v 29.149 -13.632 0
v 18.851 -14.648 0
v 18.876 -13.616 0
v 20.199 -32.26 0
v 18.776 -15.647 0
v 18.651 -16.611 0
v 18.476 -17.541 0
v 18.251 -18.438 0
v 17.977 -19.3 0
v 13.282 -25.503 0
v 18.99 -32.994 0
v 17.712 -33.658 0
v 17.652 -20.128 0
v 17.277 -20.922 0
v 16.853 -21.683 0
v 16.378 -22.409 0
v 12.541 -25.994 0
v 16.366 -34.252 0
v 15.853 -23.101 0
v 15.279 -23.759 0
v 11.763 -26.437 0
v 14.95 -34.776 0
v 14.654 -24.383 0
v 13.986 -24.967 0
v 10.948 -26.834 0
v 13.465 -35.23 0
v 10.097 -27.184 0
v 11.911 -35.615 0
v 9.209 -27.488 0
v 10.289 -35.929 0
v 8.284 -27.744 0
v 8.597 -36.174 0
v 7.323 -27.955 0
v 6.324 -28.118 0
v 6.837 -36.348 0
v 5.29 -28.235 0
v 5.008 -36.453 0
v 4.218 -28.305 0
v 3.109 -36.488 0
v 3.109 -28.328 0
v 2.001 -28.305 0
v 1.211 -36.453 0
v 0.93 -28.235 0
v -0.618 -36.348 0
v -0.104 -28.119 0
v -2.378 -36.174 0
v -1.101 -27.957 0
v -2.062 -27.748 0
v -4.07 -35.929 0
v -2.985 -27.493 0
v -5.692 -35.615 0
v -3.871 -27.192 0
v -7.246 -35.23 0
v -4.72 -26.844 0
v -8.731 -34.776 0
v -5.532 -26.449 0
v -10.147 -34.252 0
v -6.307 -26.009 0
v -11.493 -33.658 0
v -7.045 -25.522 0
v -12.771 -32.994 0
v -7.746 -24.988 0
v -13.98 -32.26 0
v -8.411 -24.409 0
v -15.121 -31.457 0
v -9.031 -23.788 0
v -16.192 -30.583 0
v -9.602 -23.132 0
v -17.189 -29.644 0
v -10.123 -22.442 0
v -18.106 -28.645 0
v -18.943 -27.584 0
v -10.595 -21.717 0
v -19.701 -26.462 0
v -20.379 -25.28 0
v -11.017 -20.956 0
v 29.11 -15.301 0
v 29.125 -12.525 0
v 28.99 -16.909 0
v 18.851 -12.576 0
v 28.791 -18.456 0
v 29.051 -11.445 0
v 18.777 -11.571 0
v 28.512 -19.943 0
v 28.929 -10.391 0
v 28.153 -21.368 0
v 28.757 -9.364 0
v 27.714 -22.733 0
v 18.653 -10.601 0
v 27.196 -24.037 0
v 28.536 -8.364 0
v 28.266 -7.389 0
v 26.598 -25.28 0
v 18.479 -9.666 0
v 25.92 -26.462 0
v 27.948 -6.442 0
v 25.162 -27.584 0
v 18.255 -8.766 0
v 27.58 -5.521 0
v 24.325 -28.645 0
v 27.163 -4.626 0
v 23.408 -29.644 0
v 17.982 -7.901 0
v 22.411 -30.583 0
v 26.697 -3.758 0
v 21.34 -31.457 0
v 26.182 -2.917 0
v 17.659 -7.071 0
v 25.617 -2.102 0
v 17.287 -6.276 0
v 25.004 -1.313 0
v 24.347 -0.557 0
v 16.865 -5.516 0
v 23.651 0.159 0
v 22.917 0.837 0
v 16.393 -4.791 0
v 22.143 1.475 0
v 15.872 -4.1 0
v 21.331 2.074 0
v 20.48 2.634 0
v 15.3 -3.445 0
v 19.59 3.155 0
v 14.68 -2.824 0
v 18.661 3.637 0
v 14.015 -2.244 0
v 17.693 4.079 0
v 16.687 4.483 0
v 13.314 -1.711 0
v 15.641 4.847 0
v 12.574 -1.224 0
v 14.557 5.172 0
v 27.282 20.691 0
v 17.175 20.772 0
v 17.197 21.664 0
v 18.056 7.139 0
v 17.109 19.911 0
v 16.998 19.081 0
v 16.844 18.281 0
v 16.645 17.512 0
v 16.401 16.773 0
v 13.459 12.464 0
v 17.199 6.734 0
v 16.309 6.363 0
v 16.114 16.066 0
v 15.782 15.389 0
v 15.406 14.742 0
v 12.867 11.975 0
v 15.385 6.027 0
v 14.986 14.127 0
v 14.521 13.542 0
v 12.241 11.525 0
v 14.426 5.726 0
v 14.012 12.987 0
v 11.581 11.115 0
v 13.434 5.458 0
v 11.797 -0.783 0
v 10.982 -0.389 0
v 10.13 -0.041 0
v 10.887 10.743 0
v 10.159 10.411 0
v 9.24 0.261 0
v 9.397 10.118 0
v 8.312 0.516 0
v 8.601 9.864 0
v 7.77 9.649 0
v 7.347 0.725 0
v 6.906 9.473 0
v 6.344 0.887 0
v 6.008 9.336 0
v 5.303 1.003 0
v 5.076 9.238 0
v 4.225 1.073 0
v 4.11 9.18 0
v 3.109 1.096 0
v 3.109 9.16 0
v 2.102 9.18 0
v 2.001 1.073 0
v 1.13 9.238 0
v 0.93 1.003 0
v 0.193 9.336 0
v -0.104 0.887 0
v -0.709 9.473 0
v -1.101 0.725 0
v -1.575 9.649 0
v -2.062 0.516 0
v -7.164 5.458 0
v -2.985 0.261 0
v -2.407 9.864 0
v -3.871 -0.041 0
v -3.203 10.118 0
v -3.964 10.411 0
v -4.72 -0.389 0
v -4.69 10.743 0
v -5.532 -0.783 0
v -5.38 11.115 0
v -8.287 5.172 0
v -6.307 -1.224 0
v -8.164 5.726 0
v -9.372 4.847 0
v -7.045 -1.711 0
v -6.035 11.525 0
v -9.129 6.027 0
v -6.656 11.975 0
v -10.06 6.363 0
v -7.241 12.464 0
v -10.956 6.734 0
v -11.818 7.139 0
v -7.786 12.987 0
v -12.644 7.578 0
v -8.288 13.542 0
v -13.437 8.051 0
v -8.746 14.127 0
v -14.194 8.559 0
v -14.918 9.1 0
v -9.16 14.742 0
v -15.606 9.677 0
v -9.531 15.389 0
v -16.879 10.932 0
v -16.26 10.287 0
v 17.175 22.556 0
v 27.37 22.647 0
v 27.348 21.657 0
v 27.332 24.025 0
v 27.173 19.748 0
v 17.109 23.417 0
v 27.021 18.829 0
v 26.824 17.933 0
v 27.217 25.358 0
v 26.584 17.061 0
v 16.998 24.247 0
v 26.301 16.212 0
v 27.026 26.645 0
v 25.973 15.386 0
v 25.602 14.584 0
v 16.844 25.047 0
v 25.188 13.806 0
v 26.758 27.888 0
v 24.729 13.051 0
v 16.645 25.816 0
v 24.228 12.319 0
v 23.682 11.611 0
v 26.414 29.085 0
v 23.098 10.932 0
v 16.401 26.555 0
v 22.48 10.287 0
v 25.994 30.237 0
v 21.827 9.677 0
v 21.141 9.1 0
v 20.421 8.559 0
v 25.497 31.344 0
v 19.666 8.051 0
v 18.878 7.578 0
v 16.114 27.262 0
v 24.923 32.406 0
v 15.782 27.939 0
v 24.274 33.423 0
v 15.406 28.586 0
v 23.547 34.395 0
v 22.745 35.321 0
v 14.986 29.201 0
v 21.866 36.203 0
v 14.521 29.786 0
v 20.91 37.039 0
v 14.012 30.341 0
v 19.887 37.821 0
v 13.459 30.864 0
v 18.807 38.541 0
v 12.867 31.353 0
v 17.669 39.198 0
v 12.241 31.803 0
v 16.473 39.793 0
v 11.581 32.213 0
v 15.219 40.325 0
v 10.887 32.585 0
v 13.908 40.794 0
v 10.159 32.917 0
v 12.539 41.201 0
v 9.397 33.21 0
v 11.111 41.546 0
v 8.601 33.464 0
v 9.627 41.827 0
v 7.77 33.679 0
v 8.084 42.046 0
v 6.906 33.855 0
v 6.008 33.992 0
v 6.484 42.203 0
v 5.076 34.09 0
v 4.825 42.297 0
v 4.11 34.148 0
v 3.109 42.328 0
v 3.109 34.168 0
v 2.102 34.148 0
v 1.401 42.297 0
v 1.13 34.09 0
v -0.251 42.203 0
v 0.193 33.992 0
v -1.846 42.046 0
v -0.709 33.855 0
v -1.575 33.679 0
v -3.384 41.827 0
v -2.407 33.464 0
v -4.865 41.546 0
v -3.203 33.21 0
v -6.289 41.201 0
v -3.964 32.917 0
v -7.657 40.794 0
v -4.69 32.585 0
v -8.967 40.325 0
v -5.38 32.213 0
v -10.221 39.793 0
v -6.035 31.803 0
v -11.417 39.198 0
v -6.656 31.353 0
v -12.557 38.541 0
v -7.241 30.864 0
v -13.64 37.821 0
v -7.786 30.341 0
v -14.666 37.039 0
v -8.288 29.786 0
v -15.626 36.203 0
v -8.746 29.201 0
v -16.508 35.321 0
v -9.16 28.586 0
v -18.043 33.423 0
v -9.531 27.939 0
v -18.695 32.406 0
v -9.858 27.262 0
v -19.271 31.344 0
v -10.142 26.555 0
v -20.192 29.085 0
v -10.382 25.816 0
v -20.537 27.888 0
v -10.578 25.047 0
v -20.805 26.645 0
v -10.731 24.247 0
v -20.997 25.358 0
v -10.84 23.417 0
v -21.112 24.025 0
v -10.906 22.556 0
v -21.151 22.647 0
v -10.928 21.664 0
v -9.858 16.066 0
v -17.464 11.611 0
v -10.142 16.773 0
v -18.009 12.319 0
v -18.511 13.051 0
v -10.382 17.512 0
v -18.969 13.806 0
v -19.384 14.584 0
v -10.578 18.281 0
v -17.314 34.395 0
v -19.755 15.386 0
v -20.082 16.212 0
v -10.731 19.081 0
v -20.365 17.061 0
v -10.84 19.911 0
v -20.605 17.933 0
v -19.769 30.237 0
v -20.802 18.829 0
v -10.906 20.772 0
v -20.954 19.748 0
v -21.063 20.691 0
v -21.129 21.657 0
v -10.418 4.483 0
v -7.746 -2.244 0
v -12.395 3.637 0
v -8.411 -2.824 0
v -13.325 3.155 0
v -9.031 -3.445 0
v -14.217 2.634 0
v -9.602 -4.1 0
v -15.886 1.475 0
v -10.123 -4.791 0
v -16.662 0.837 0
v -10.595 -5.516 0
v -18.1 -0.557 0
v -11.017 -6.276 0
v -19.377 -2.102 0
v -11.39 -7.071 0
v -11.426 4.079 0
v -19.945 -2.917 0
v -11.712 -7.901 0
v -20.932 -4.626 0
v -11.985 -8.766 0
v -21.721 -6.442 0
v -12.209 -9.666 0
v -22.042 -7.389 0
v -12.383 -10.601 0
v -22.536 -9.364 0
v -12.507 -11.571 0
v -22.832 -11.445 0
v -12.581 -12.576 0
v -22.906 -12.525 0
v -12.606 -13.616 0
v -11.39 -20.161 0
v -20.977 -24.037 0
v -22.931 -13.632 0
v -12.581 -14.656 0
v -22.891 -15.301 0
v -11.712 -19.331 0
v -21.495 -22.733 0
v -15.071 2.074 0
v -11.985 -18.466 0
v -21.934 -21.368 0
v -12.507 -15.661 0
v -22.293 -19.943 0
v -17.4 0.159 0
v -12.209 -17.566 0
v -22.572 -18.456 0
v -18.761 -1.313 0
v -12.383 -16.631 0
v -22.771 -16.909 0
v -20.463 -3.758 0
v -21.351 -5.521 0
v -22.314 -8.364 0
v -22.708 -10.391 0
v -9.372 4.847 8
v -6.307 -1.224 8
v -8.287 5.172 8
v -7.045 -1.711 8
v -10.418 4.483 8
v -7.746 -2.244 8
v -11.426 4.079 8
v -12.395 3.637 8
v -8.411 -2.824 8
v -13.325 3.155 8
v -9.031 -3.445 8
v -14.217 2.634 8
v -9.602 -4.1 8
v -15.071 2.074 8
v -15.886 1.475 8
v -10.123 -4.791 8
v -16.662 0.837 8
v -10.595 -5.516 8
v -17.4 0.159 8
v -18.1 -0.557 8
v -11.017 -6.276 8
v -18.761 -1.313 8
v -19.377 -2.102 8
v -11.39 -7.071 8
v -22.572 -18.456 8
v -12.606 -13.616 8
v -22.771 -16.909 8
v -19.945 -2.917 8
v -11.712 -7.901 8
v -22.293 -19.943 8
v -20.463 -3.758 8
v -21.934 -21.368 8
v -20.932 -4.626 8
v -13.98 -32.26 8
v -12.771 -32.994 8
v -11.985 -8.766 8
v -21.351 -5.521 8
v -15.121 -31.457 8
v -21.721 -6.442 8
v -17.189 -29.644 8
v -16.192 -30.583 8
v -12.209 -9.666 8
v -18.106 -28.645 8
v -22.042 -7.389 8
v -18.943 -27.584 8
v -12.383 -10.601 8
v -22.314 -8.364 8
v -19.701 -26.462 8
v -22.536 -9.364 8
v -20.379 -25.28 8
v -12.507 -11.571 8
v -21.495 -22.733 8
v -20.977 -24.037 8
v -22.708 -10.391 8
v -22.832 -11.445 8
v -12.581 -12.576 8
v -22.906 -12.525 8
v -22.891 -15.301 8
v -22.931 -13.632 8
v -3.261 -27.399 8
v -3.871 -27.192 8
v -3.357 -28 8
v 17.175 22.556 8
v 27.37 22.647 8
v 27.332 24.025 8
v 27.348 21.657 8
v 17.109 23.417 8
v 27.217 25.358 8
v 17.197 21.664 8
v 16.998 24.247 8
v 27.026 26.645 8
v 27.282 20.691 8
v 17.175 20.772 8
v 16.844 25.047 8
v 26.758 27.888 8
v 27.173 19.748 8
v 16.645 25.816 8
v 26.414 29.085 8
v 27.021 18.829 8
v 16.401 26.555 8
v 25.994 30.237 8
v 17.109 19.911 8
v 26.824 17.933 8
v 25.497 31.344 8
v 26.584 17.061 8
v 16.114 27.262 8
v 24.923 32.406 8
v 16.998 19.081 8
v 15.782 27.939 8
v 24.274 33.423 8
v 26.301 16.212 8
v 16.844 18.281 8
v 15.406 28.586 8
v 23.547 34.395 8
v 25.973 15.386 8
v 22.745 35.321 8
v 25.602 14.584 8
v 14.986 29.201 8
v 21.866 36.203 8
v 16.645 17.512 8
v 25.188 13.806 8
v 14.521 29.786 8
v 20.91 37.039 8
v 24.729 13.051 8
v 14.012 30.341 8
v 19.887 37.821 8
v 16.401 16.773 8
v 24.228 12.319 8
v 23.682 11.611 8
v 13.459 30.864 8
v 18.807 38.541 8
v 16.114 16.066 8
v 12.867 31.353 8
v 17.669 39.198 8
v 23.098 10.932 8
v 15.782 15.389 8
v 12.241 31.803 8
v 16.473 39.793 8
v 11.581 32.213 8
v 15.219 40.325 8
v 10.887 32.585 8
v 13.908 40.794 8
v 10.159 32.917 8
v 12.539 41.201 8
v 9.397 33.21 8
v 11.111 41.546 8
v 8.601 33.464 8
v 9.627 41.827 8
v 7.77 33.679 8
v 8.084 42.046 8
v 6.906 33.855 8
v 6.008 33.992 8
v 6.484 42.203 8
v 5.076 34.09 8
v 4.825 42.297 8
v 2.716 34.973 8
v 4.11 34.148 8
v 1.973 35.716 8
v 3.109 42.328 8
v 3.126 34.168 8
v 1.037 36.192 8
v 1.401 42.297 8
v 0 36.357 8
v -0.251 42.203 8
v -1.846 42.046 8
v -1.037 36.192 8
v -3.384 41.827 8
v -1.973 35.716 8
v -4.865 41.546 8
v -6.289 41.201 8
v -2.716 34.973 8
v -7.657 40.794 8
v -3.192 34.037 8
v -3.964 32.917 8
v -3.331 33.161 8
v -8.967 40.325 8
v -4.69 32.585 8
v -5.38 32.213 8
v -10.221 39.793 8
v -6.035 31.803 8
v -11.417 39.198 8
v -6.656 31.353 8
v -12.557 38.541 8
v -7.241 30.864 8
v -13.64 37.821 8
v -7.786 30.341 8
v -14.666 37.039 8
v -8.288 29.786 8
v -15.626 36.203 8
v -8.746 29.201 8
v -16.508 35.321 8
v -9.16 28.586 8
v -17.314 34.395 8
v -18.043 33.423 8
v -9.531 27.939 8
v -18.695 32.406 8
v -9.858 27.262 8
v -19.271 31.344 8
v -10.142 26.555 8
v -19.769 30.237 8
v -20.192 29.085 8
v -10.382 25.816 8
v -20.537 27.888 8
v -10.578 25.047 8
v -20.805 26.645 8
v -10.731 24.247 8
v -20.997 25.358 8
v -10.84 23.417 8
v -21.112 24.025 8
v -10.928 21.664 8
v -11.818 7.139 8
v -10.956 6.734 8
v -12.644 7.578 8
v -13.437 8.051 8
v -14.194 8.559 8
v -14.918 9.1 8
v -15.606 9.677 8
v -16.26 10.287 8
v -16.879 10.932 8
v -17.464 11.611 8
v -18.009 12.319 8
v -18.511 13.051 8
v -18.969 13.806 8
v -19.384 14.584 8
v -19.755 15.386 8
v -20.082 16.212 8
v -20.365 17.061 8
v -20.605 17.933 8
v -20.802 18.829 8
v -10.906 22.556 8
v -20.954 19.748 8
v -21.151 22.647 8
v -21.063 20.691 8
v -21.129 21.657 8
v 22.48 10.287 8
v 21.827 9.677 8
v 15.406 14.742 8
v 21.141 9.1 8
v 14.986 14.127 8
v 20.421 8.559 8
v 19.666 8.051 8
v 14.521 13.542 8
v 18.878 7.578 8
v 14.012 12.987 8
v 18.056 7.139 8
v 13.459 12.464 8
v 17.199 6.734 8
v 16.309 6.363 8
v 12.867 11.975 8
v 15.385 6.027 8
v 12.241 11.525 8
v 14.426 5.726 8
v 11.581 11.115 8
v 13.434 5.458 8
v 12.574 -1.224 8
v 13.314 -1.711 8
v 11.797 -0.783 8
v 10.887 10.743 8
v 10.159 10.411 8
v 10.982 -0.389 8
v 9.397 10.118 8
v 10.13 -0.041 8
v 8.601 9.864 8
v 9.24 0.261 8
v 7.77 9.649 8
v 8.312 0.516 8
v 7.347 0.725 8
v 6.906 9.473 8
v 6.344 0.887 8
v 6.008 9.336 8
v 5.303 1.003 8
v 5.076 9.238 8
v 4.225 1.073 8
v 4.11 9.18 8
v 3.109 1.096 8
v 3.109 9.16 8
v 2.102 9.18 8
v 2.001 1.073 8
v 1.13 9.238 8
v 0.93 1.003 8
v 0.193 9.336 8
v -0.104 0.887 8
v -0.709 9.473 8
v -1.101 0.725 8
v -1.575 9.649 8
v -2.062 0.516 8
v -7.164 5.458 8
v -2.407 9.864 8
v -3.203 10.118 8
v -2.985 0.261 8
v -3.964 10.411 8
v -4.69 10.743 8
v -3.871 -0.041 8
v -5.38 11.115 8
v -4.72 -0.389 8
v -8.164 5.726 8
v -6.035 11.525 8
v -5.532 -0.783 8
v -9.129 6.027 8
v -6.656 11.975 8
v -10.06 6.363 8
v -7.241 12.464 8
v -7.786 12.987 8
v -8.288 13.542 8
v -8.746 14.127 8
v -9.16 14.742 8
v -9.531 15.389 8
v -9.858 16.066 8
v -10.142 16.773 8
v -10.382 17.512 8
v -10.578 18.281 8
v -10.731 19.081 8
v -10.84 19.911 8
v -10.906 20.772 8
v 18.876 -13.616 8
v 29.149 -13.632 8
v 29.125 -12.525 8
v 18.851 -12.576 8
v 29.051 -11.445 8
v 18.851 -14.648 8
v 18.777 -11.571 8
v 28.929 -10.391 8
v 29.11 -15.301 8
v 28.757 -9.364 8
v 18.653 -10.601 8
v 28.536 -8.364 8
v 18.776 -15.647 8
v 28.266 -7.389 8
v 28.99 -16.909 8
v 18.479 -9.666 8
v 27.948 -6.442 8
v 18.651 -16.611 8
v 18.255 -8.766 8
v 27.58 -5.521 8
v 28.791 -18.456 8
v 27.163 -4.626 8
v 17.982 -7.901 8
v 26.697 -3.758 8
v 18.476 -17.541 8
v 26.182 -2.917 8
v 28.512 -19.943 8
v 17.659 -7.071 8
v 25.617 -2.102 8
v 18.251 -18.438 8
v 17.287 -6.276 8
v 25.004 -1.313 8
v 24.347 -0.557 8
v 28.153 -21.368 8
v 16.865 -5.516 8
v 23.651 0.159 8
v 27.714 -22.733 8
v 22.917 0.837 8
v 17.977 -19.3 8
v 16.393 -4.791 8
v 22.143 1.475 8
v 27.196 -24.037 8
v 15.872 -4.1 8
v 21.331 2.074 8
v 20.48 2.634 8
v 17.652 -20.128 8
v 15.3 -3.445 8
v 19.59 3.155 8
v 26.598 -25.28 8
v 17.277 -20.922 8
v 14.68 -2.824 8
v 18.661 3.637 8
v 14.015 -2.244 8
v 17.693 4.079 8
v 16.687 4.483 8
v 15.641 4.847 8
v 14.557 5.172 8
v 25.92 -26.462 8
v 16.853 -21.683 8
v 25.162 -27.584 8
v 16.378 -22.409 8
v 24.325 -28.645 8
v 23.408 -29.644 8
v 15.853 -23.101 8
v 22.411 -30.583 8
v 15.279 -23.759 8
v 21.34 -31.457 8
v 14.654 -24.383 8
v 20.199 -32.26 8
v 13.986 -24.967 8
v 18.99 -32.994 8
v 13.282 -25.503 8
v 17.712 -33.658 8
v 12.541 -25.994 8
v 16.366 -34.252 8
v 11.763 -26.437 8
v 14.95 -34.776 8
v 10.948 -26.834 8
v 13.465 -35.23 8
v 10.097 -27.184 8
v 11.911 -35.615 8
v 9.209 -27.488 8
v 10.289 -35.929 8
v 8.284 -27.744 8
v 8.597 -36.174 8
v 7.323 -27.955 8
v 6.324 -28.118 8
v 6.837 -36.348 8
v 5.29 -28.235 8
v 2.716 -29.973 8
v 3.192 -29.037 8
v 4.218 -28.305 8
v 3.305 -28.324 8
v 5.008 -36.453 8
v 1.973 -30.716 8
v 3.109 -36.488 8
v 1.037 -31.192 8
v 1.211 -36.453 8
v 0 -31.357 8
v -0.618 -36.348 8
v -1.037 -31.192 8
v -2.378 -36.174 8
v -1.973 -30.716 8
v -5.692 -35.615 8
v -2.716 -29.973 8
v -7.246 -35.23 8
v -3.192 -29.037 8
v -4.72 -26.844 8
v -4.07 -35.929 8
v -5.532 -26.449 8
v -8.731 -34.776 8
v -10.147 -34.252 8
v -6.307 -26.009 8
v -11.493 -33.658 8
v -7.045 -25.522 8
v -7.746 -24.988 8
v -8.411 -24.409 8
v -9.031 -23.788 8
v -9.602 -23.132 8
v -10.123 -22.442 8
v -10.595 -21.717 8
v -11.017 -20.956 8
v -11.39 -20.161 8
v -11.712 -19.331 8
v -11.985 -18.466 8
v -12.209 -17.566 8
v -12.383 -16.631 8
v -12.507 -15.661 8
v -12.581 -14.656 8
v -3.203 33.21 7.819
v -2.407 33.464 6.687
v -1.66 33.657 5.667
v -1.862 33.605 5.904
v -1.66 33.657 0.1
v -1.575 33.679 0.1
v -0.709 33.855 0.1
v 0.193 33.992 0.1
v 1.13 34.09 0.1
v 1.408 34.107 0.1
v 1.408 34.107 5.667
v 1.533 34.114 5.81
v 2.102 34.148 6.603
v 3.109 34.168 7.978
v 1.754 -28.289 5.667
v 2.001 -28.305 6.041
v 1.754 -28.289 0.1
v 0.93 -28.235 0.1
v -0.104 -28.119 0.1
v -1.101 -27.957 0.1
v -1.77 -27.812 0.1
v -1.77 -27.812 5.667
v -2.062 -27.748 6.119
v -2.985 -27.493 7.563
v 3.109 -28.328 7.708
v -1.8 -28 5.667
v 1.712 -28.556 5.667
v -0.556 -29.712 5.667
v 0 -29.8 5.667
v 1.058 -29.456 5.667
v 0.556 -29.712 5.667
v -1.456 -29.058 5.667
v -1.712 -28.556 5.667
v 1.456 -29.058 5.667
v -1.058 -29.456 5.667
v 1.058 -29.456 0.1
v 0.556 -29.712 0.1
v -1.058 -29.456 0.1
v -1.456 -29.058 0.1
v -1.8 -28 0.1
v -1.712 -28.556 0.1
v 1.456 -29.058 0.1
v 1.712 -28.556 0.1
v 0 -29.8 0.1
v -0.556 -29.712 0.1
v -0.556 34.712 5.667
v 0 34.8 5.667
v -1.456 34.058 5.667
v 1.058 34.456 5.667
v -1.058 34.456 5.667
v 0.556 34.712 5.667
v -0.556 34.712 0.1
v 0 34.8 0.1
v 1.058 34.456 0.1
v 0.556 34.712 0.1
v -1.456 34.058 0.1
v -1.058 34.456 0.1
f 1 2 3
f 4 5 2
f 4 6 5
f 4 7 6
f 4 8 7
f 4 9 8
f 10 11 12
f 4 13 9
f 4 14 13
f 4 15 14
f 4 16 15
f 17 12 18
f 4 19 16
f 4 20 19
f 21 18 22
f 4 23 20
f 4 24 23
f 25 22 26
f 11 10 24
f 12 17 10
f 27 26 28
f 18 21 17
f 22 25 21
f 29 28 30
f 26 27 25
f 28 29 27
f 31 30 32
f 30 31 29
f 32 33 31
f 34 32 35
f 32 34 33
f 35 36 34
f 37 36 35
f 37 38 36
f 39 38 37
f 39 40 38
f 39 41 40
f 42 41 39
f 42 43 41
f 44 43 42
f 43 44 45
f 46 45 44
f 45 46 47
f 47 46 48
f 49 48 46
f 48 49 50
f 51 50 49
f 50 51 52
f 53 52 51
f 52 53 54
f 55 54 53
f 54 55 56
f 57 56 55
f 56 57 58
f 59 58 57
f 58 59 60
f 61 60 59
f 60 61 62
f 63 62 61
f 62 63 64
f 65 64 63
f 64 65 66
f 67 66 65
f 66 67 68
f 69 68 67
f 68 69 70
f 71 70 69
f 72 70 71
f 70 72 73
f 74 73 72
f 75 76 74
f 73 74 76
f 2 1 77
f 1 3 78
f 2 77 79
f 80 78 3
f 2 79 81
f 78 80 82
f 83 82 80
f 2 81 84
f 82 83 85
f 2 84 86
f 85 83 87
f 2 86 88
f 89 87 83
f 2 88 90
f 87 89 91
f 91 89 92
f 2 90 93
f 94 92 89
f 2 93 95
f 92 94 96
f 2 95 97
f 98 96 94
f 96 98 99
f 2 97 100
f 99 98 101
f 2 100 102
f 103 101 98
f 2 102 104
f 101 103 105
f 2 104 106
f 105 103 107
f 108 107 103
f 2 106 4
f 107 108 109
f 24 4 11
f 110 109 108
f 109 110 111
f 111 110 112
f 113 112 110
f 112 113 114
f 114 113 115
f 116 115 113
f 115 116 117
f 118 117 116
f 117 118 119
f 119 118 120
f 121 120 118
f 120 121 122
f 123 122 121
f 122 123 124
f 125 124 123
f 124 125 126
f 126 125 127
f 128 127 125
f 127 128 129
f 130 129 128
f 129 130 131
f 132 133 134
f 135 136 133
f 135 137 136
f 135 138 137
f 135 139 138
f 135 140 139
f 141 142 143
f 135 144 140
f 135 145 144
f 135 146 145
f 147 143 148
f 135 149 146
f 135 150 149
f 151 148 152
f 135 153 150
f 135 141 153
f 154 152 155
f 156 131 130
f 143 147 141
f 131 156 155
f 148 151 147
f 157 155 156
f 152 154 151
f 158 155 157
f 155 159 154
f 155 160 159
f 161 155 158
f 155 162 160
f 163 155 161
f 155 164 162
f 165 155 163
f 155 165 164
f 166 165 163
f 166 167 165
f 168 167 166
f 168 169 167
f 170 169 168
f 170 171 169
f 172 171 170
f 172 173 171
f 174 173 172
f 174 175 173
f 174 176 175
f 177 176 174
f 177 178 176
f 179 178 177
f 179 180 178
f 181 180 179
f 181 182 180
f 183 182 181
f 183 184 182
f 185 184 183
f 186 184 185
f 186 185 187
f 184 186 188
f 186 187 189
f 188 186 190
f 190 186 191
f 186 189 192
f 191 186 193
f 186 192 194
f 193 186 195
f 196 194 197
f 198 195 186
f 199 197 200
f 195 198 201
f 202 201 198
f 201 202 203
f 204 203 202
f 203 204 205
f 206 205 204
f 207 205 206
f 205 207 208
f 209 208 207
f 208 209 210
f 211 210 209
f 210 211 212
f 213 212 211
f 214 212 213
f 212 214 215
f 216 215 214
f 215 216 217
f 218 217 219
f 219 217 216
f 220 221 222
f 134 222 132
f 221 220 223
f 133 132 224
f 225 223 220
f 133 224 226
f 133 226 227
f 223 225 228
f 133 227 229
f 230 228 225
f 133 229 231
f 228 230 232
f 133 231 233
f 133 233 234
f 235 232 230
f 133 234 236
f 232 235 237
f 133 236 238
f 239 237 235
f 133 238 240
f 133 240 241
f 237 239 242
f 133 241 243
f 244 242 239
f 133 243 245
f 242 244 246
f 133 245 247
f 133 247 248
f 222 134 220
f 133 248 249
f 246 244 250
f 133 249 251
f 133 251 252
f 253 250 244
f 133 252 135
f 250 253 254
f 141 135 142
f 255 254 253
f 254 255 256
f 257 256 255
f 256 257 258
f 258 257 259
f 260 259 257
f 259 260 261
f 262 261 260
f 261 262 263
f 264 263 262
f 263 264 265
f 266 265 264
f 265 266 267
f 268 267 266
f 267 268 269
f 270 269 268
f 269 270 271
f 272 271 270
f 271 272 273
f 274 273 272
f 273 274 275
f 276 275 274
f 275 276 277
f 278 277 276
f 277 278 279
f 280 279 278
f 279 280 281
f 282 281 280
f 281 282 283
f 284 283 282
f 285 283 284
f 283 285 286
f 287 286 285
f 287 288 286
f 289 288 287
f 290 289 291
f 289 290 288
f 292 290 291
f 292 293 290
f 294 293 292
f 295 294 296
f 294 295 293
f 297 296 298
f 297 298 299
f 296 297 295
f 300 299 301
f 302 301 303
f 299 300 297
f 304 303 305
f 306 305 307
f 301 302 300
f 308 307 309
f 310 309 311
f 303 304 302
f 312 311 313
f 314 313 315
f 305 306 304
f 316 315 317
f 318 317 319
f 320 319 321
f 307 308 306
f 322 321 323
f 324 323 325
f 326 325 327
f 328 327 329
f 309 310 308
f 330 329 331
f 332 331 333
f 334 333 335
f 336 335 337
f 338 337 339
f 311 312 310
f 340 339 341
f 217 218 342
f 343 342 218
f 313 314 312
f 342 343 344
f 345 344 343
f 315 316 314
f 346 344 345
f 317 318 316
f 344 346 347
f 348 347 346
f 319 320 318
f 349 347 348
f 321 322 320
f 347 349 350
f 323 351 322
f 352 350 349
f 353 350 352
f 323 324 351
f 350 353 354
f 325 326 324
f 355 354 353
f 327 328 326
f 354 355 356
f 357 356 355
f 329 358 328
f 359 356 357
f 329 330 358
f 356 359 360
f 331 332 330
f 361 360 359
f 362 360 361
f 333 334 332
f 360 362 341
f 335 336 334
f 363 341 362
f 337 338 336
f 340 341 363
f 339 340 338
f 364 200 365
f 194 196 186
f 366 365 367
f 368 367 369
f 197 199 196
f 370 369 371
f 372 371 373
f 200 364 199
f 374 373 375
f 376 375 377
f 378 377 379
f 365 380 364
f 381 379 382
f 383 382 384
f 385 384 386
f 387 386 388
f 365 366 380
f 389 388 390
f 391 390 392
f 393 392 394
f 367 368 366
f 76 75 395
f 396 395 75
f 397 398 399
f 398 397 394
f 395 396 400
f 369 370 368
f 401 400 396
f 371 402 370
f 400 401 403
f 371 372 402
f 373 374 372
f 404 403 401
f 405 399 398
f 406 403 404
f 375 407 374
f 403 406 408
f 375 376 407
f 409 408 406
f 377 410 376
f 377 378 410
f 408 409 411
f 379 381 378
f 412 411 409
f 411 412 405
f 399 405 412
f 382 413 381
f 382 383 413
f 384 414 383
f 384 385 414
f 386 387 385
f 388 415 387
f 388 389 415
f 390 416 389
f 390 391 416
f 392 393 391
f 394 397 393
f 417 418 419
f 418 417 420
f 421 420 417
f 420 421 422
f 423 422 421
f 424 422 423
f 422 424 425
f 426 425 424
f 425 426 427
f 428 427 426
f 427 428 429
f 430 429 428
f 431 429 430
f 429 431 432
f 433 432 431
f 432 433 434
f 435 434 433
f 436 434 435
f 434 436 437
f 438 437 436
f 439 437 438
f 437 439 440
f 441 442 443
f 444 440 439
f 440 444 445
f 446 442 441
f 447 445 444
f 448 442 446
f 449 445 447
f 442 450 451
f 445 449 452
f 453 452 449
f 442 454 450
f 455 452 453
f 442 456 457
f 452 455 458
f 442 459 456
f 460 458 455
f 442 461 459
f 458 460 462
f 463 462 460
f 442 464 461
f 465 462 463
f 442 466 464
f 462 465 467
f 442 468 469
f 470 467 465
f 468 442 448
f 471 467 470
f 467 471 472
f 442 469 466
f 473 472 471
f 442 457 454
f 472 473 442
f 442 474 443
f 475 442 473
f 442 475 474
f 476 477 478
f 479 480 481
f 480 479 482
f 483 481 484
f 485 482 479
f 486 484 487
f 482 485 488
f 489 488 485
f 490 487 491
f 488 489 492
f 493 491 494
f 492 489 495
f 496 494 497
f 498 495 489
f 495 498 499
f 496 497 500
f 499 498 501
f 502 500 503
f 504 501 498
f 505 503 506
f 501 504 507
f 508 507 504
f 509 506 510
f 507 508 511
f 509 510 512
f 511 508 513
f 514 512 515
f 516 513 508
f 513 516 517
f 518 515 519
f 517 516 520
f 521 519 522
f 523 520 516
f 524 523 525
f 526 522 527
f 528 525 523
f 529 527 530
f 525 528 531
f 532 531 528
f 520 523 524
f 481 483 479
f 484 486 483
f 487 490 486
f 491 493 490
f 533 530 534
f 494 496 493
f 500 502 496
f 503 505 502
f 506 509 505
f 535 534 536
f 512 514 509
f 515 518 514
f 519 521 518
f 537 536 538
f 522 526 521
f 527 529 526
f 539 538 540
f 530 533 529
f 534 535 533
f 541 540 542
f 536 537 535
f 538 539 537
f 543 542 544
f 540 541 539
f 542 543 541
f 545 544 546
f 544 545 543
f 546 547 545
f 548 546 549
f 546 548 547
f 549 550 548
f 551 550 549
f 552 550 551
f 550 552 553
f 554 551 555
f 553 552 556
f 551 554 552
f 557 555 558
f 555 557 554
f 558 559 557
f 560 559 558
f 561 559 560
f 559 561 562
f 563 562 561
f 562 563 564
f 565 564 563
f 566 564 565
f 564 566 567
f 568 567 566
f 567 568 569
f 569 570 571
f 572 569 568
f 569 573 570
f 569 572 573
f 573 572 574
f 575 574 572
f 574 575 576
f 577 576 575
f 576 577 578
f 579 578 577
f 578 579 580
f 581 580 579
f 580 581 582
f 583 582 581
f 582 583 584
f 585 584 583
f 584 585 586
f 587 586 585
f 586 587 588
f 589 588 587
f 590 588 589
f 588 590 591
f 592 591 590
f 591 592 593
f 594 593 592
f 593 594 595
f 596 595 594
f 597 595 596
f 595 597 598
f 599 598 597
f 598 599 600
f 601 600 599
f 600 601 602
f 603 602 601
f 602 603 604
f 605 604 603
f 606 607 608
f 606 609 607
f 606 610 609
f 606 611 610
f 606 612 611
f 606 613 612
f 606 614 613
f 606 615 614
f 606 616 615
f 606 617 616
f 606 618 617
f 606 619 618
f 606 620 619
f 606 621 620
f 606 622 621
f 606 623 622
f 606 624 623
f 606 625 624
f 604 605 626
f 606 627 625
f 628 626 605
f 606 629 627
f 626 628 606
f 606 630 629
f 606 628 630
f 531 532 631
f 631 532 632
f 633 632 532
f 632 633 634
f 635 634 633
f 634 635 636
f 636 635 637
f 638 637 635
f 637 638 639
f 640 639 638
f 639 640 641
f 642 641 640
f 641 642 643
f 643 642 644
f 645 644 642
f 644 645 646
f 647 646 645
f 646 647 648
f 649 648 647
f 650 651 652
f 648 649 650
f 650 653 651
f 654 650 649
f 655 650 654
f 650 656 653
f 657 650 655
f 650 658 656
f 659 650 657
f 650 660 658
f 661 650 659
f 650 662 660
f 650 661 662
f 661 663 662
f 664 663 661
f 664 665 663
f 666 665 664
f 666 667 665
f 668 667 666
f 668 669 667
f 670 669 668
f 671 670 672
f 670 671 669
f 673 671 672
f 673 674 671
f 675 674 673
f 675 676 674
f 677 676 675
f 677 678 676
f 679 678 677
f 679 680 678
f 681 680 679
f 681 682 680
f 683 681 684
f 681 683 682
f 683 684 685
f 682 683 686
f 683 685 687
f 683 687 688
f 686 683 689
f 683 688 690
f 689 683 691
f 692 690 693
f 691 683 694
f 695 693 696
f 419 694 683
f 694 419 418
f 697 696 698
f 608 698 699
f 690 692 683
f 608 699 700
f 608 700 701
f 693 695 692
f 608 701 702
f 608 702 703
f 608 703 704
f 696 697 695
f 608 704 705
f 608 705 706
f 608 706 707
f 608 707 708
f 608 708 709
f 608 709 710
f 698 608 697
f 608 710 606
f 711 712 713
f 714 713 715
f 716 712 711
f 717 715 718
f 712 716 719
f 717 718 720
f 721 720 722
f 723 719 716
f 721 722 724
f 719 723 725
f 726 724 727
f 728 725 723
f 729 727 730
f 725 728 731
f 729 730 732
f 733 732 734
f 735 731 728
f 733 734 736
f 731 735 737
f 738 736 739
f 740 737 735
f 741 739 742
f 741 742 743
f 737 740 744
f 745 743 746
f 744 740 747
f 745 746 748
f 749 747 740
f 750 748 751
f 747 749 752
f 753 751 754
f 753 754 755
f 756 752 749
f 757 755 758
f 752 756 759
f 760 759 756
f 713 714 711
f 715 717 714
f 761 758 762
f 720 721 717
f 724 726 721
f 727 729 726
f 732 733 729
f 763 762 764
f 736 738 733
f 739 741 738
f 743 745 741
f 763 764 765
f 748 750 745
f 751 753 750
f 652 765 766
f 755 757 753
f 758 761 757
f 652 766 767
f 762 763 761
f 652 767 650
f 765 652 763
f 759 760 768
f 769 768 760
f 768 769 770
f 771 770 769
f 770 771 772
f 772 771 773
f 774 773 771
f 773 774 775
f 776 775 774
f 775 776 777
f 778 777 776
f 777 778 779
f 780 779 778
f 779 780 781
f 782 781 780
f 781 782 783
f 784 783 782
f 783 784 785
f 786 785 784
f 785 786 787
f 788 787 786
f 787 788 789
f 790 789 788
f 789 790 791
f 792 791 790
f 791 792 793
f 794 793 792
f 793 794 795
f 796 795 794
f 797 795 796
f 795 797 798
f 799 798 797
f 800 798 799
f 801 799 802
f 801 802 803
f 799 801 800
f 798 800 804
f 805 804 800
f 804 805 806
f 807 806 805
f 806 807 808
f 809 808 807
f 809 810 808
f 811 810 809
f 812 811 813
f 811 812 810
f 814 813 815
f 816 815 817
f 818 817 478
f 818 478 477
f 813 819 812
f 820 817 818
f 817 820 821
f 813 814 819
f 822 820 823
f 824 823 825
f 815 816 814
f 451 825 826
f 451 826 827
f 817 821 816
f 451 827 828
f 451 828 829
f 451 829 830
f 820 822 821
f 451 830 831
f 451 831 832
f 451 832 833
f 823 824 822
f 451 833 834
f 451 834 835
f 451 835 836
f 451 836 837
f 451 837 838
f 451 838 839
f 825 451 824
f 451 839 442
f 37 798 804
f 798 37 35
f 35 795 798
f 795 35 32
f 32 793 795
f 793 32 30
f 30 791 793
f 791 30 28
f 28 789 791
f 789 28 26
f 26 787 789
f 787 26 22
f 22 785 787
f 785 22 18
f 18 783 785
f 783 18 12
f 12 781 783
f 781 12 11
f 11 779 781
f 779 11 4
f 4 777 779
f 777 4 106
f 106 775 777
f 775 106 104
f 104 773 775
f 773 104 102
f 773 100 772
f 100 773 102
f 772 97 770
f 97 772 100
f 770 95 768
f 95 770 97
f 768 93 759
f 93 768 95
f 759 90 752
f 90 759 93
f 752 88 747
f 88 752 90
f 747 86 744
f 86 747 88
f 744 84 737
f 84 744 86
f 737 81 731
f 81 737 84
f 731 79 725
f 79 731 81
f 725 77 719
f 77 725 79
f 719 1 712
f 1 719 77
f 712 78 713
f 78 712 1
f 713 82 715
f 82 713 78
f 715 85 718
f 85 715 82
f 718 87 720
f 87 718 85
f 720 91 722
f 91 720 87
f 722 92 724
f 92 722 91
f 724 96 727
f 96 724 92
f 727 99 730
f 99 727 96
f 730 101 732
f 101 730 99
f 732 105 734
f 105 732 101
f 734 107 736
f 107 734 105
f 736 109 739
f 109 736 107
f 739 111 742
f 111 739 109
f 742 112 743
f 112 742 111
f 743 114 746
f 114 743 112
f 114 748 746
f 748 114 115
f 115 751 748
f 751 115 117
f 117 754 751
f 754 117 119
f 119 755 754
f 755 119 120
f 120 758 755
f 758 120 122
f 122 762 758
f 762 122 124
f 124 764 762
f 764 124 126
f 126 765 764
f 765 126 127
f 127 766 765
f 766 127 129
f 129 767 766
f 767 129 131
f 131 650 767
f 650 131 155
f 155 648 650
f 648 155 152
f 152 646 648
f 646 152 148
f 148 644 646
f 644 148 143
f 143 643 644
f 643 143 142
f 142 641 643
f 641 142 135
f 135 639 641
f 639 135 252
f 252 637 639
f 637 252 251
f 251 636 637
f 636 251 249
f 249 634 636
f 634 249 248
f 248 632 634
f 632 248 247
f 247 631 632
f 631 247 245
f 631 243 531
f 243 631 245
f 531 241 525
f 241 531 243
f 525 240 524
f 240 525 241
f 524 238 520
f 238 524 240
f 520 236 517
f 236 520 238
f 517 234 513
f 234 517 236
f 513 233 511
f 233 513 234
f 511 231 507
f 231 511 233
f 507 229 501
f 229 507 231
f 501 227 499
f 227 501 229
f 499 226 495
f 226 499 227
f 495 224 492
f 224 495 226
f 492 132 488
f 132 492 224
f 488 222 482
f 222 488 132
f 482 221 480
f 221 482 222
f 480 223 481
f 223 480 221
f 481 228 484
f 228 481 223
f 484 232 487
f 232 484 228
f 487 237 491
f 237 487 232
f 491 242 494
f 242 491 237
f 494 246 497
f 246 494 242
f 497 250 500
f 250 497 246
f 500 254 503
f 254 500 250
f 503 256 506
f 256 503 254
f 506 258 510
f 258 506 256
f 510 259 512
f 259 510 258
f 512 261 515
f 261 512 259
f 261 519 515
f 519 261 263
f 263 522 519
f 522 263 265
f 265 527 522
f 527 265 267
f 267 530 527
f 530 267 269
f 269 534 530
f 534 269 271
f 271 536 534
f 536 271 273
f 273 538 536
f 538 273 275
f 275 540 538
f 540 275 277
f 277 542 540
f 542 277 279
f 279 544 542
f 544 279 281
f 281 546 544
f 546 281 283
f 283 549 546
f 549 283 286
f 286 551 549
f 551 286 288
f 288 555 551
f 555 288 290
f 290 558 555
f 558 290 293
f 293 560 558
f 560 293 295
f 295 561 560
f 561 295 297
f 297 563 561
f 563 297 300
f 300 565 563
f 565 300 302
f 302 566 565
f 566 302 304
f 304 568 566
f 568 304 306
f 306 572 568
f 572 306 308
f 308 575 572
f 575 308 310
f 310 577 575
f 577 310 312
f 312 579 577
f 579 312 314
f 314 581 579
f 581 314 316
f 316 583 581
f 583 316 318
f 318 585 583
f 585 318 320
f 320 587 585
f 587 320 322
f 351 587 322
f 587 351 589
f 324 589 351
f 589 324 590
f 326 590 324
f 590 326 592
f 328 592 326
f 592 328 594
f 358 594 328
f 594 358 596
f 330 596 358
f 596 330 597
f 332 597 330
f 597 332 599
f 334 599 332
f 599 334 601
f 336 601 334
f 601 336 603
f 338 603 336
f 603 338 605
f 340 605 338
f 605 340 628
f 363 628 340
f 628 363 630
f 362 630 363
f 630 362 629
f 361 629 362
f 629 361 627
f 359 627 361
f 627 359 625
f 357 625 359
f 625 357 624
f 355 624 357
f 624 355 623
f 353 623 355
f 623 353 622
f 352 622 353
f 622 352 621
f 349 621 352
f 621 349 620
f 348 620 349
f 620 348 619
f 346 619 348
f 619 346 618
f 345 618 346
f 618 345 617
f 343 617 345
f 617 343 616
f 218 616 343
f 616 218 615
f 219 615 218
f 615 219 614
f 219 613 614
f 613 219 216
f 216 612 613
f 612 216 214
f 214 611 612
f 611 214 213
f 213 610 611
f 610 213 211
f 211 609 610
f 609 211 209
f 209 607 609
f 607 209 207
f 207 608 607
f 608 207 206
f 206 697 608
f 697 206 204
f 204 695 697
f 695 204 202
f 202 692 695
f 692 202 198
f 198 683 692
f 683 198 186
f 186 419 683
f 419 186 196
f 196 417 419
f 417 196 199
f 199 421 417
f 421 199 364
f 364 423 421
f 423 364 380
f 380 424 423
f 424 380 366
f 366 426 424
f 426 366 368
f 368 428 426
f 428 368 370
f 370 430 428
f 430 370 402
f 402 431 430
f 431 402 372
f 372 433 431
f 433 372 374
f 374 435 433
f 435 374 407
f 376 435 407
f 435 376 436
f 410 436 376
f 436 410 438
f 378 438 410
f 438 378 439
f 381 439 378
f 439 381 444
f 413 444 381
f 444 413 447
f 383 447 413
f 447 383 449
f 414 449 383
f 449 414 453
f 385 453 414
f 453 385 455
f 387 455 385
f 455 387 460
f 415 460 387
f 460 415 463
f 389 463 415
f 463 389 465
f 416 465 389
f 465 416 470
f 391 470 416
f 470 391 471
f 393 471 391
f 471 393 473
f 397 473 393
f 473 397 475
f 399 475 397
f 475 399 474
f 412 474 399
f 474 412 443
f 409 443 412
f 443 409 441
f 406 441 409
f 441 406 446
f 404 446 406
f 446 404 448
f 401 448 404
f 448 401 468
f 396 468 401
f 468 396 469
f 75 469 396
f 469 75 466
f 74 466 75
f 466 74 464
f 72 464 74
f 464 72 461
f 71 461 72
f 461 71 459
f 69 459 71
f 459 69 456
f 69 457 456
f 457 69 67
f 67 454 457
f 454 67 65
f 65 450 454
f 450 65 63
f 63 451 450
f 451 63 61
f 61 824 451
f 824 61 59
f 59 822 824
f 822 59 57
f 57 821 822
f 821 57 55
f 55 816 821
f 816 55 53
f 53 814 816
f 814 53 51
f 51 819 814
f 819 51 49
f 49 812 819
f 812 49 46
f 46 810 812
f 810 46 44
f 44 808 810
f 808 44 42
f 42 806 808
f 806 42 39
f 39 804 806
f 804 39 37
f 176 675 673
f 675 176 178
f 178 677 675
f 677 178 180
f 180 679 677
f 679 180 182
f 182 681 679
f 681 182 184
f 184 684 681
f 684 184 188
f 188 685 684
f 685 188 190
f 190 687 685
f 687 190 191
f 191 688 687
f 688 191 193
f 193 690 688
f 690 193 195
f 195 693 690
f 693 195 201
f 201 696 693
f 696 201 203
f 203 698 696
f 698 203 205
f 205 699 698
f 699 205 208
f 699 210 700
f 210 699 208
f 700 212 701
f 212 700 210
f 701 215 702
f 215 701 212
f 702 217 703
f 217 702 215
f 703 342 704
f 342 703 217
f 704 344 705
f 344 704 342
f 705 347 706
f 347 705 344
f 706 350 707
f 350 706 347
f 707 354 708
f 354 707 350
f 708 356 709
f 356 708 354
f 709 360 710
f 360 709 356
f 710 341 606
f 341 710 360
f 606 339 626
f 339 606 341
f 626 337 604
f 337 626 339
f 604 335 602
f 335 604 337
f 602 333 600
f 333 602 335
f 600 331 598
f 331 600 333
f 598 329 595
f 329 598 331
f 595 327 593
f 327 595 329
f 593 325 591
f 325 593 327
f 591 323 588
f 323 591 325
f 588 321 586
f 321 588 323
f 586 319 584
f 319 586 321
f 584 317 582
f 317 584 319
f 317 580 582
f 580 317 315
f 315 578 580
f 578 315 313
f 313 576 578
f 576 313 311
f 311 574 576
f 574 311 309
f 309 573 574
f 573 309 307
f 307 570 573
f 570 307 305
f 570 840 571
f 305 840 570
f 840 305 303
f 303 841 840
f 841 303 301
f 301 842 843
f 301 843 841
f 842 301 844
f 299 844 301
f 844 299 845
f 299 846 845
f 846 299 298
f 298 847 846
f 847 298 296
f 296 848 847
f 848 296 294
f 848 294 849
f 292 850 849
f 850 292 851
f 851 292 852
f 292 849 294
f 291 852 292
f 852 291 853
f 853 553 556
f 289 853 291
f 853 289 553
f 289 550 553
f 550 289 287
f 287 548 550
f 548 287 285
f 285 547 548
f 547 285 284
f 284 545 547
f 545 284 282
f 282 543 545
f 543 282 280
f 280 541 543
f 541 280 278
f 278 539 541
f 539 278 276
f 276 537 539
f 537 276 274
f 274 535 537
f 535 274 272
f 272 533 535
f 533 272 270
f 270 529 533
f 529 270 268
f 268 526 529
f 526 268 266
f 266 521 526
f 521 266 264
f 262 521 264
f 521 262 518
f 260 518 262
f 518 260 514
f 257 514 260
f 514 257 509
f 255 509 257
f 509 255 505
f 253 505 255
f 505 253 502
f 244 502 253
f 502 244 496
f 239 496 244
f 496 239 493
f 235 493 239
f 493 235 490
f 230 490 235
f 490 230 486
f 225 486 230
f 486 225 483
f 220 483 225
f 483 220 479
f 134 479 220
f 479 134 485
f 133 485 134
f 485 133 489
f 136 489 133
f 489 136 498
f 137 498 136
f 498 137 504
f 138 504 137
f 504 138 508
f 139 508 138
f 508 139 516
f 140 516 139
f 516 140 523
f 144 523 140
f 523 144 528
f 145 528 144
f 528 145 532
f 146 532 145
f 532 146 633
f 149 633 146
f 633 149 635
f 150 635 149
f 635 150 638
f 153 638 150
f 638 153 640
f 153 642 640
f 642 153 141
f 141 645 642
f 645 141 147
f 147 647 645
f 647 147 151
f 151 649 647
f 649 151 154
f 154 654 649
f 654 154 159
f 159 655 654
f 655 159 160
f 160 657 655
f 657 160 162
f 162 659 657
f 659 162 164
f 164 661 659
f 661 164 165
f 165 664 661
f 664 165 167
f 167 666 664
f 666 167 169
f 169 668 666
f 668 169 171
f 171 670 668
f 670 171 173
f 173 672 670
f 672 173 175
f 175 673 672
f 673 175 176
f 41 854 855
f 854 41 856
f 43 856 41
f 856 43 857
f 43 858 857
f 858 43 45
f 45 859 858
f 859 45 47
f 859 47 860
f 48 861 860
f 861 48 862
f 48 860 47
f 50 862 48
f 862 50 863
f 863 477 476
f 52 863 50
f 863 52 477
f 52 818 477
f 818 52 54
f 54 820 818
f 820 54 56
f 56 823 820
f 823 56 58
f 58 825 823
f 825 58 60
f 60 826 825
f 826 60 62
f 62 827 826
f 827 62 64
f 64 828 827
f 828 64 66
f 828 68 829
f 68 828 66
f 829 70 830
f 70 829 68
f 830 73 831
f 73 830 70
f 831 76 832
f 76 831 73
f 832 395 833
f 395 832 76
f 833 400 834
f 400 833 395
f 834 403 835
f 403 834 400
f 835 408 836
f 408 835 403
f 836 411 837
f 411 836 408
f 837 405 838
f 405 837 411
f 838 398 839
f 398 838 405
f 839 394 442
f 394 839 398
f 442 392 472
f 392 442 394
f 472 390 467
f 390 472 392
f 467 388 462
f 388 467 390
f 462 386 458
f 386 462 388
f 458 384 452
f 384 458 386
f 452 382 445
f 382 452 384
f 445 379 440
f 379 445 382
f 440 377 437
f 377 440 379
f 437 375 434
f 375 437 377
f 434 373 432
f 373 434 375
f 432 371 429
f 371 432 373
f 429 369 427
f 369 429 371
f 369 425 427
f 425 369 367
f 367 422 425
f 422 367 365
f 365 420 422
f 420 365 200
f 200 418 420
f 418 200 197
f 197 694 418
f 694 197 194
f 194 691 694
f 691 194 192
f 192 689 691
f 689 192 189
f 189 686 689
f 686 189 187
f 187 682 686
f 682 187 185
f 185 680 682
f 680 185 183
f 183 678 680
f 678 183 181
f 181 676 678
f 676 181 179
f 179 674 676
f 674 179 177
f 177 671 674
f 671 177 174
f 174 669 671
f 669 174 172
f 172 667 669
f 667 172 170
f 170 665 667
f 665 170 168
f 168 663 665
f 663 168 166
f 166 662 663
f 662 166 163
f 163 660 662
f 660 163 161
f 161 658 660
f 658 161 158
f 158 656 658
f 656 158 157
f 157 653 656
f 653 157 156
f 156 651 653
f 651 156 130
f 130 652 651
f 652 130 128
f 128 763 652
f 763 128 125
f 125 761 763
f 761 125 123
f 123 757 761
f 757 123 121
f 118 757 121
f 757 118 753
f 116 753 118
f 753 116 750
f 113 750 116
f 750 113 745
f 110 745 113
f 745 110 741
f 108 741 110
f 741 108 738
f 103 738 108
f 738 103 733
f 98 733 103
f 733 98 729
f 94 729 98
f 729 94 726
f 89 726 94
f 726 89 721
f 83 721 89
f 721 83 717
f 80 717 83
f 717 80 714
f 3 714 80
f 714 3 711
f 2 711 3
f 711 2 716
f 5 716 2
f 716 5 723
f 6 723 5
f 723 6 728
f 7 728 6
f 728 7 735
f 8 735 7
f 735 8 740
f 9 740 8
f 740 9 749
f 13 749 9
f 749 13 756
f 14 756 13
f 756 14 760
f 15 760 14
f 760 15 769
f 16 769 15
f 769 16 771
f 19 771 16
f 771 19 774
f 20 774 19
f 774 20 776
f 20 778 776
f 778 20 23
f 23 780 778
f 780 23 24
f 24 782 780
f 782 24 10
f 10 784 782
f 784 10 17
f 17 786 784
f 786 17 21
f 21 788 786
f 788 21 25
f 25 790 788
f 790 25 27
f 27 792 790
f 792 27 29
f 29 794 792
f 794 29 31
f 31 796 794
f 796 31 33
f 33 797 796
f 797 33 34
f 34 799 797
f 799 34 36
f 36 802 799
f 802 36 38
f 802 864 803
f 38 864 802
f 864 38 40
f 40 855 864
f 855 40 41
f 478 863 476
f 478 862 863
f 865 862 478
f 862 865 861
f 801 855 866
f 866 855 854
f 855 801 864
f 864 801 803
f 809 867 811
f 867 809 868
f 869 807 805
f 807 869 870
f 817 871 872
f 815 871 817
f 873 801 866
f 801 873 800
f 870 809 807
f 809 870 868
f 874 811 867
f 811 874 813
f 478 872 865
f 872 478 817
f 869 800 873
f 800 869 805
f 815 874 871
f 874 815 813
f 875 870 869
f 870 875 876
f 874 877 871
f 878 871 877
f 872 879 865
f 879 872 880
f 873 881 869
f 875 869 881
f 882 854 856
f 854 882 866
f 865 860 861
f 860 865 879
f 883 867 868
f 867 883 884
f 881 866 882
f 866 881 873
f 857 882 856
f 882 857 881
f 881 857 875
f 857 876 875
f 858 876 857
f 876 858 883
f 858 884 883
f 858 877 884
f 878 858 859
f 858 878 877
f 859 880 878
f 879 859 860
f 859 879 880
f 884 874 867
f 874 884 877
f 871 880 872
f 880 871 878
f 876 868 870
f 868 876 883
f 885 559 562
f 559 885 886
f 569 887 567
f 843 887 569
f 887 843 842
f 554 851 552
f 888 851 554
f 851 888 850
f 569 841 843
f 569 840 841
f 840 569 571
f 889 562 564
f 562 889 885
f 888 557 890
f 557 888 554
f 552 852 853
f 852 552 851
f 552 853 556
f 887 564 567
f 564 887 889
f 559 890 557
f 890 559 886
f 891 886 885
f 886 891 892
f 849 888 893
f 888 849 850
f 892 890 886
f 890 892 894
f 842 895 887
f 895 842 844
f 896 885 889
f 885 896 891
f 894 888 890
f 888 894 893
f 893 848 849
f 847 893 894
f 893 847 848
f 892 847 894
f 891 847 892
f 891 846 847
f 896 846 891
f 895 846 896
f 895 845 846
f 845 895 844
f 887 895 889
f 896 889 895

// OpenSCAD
// Street Numbers for 3D printing
// Charles Tilford, 2019
// License: CC BY-NC-SA 4.0
//   https://creativecommons.org/licenses/by-nc-sa/4.0/

char="8";     // The number/letter to print

// Units are in mm, except for height of letter

// How many inches high should letter be?
inchesHigh=3;
// How thick/deep should letter be (mm)?
depth=8;

// Character coordinates just center the letter
charX=-30;    // Character X coord
charY=-35;    // Character Y coord
topScrew=33;  // Top screw Y coord
botScrew=-28; // Bottom screw Y coord
height=8;     // Thickness of character
// Screw dimensions. Default presumes
// #6 sheet metal screw
screwWid=3.6; // Width of screw shaft
screwTop=6.78;// Width of screw head
screwCon=5.08;// Height of head 'cone'

// Font to print in. Your system needs this
// installed, of course. If changed the hole
// positions almost certainly need to be
// changed, and maybe charX/charY.
fName="Open Sans Extrabold";
// https://fonts.google.com/specimen/Open+Sans
// Designer: Steve Matteson

// Thin floor below holes. My printer was
// struggling to have the hole 'border' stick
// to the stage. Just drill/screw thru it.
holeFloor=0.1; 

// ==========================================
// ===== All values below are auto-calculated
// ==========================================

// Scaled values
scaleFactor=inchesHigh / 3;
cX=charX * scaleFactor;
cY=charY * scaleFactor;
tS=topScrew * scaleFactor;
bS=botScrew * scaleFactor;
// Where do we start drawing screw head cone?
oS=depth - (screwCon-.05);

difference() {
  // We use difference() to punch out the screw holes
  // in the character
    
  // The character itself, 8mm thick
  translate([cX,cY,0])
    linear_extrude(height=depth, scale=1)
    text(char, size=(75*scaleFactor),
         $fn=100, font=fName);
    
  // Bottom screw hole
  translate([0,bS,oS]) color("red")
    cylinder(h=screwCon, d2=screwTop,
             d1=0, $fn=20);
   translate([0,bS,holeFloor])
    cylinder(h=20, d=screwWid, $fn=20);
    
  // Top screw hole
  translate([0,tS,oS]) color("red")
    cylinder(h=screwCon, d2=screwTop,
             d1=0, $fn=20);
  translate([0,tS,holeFloor])
    cylinder(h=20, d=screwWid, $fn=20);
}

// Colors are just to aid visualization of
// void spaces. $fn is "featuer number", ie how
// many polygons are devoted to object. The values
// above should be near your printing limit anyway.

// Developed in OpenSCAD
//    https://www.openscad.org/
